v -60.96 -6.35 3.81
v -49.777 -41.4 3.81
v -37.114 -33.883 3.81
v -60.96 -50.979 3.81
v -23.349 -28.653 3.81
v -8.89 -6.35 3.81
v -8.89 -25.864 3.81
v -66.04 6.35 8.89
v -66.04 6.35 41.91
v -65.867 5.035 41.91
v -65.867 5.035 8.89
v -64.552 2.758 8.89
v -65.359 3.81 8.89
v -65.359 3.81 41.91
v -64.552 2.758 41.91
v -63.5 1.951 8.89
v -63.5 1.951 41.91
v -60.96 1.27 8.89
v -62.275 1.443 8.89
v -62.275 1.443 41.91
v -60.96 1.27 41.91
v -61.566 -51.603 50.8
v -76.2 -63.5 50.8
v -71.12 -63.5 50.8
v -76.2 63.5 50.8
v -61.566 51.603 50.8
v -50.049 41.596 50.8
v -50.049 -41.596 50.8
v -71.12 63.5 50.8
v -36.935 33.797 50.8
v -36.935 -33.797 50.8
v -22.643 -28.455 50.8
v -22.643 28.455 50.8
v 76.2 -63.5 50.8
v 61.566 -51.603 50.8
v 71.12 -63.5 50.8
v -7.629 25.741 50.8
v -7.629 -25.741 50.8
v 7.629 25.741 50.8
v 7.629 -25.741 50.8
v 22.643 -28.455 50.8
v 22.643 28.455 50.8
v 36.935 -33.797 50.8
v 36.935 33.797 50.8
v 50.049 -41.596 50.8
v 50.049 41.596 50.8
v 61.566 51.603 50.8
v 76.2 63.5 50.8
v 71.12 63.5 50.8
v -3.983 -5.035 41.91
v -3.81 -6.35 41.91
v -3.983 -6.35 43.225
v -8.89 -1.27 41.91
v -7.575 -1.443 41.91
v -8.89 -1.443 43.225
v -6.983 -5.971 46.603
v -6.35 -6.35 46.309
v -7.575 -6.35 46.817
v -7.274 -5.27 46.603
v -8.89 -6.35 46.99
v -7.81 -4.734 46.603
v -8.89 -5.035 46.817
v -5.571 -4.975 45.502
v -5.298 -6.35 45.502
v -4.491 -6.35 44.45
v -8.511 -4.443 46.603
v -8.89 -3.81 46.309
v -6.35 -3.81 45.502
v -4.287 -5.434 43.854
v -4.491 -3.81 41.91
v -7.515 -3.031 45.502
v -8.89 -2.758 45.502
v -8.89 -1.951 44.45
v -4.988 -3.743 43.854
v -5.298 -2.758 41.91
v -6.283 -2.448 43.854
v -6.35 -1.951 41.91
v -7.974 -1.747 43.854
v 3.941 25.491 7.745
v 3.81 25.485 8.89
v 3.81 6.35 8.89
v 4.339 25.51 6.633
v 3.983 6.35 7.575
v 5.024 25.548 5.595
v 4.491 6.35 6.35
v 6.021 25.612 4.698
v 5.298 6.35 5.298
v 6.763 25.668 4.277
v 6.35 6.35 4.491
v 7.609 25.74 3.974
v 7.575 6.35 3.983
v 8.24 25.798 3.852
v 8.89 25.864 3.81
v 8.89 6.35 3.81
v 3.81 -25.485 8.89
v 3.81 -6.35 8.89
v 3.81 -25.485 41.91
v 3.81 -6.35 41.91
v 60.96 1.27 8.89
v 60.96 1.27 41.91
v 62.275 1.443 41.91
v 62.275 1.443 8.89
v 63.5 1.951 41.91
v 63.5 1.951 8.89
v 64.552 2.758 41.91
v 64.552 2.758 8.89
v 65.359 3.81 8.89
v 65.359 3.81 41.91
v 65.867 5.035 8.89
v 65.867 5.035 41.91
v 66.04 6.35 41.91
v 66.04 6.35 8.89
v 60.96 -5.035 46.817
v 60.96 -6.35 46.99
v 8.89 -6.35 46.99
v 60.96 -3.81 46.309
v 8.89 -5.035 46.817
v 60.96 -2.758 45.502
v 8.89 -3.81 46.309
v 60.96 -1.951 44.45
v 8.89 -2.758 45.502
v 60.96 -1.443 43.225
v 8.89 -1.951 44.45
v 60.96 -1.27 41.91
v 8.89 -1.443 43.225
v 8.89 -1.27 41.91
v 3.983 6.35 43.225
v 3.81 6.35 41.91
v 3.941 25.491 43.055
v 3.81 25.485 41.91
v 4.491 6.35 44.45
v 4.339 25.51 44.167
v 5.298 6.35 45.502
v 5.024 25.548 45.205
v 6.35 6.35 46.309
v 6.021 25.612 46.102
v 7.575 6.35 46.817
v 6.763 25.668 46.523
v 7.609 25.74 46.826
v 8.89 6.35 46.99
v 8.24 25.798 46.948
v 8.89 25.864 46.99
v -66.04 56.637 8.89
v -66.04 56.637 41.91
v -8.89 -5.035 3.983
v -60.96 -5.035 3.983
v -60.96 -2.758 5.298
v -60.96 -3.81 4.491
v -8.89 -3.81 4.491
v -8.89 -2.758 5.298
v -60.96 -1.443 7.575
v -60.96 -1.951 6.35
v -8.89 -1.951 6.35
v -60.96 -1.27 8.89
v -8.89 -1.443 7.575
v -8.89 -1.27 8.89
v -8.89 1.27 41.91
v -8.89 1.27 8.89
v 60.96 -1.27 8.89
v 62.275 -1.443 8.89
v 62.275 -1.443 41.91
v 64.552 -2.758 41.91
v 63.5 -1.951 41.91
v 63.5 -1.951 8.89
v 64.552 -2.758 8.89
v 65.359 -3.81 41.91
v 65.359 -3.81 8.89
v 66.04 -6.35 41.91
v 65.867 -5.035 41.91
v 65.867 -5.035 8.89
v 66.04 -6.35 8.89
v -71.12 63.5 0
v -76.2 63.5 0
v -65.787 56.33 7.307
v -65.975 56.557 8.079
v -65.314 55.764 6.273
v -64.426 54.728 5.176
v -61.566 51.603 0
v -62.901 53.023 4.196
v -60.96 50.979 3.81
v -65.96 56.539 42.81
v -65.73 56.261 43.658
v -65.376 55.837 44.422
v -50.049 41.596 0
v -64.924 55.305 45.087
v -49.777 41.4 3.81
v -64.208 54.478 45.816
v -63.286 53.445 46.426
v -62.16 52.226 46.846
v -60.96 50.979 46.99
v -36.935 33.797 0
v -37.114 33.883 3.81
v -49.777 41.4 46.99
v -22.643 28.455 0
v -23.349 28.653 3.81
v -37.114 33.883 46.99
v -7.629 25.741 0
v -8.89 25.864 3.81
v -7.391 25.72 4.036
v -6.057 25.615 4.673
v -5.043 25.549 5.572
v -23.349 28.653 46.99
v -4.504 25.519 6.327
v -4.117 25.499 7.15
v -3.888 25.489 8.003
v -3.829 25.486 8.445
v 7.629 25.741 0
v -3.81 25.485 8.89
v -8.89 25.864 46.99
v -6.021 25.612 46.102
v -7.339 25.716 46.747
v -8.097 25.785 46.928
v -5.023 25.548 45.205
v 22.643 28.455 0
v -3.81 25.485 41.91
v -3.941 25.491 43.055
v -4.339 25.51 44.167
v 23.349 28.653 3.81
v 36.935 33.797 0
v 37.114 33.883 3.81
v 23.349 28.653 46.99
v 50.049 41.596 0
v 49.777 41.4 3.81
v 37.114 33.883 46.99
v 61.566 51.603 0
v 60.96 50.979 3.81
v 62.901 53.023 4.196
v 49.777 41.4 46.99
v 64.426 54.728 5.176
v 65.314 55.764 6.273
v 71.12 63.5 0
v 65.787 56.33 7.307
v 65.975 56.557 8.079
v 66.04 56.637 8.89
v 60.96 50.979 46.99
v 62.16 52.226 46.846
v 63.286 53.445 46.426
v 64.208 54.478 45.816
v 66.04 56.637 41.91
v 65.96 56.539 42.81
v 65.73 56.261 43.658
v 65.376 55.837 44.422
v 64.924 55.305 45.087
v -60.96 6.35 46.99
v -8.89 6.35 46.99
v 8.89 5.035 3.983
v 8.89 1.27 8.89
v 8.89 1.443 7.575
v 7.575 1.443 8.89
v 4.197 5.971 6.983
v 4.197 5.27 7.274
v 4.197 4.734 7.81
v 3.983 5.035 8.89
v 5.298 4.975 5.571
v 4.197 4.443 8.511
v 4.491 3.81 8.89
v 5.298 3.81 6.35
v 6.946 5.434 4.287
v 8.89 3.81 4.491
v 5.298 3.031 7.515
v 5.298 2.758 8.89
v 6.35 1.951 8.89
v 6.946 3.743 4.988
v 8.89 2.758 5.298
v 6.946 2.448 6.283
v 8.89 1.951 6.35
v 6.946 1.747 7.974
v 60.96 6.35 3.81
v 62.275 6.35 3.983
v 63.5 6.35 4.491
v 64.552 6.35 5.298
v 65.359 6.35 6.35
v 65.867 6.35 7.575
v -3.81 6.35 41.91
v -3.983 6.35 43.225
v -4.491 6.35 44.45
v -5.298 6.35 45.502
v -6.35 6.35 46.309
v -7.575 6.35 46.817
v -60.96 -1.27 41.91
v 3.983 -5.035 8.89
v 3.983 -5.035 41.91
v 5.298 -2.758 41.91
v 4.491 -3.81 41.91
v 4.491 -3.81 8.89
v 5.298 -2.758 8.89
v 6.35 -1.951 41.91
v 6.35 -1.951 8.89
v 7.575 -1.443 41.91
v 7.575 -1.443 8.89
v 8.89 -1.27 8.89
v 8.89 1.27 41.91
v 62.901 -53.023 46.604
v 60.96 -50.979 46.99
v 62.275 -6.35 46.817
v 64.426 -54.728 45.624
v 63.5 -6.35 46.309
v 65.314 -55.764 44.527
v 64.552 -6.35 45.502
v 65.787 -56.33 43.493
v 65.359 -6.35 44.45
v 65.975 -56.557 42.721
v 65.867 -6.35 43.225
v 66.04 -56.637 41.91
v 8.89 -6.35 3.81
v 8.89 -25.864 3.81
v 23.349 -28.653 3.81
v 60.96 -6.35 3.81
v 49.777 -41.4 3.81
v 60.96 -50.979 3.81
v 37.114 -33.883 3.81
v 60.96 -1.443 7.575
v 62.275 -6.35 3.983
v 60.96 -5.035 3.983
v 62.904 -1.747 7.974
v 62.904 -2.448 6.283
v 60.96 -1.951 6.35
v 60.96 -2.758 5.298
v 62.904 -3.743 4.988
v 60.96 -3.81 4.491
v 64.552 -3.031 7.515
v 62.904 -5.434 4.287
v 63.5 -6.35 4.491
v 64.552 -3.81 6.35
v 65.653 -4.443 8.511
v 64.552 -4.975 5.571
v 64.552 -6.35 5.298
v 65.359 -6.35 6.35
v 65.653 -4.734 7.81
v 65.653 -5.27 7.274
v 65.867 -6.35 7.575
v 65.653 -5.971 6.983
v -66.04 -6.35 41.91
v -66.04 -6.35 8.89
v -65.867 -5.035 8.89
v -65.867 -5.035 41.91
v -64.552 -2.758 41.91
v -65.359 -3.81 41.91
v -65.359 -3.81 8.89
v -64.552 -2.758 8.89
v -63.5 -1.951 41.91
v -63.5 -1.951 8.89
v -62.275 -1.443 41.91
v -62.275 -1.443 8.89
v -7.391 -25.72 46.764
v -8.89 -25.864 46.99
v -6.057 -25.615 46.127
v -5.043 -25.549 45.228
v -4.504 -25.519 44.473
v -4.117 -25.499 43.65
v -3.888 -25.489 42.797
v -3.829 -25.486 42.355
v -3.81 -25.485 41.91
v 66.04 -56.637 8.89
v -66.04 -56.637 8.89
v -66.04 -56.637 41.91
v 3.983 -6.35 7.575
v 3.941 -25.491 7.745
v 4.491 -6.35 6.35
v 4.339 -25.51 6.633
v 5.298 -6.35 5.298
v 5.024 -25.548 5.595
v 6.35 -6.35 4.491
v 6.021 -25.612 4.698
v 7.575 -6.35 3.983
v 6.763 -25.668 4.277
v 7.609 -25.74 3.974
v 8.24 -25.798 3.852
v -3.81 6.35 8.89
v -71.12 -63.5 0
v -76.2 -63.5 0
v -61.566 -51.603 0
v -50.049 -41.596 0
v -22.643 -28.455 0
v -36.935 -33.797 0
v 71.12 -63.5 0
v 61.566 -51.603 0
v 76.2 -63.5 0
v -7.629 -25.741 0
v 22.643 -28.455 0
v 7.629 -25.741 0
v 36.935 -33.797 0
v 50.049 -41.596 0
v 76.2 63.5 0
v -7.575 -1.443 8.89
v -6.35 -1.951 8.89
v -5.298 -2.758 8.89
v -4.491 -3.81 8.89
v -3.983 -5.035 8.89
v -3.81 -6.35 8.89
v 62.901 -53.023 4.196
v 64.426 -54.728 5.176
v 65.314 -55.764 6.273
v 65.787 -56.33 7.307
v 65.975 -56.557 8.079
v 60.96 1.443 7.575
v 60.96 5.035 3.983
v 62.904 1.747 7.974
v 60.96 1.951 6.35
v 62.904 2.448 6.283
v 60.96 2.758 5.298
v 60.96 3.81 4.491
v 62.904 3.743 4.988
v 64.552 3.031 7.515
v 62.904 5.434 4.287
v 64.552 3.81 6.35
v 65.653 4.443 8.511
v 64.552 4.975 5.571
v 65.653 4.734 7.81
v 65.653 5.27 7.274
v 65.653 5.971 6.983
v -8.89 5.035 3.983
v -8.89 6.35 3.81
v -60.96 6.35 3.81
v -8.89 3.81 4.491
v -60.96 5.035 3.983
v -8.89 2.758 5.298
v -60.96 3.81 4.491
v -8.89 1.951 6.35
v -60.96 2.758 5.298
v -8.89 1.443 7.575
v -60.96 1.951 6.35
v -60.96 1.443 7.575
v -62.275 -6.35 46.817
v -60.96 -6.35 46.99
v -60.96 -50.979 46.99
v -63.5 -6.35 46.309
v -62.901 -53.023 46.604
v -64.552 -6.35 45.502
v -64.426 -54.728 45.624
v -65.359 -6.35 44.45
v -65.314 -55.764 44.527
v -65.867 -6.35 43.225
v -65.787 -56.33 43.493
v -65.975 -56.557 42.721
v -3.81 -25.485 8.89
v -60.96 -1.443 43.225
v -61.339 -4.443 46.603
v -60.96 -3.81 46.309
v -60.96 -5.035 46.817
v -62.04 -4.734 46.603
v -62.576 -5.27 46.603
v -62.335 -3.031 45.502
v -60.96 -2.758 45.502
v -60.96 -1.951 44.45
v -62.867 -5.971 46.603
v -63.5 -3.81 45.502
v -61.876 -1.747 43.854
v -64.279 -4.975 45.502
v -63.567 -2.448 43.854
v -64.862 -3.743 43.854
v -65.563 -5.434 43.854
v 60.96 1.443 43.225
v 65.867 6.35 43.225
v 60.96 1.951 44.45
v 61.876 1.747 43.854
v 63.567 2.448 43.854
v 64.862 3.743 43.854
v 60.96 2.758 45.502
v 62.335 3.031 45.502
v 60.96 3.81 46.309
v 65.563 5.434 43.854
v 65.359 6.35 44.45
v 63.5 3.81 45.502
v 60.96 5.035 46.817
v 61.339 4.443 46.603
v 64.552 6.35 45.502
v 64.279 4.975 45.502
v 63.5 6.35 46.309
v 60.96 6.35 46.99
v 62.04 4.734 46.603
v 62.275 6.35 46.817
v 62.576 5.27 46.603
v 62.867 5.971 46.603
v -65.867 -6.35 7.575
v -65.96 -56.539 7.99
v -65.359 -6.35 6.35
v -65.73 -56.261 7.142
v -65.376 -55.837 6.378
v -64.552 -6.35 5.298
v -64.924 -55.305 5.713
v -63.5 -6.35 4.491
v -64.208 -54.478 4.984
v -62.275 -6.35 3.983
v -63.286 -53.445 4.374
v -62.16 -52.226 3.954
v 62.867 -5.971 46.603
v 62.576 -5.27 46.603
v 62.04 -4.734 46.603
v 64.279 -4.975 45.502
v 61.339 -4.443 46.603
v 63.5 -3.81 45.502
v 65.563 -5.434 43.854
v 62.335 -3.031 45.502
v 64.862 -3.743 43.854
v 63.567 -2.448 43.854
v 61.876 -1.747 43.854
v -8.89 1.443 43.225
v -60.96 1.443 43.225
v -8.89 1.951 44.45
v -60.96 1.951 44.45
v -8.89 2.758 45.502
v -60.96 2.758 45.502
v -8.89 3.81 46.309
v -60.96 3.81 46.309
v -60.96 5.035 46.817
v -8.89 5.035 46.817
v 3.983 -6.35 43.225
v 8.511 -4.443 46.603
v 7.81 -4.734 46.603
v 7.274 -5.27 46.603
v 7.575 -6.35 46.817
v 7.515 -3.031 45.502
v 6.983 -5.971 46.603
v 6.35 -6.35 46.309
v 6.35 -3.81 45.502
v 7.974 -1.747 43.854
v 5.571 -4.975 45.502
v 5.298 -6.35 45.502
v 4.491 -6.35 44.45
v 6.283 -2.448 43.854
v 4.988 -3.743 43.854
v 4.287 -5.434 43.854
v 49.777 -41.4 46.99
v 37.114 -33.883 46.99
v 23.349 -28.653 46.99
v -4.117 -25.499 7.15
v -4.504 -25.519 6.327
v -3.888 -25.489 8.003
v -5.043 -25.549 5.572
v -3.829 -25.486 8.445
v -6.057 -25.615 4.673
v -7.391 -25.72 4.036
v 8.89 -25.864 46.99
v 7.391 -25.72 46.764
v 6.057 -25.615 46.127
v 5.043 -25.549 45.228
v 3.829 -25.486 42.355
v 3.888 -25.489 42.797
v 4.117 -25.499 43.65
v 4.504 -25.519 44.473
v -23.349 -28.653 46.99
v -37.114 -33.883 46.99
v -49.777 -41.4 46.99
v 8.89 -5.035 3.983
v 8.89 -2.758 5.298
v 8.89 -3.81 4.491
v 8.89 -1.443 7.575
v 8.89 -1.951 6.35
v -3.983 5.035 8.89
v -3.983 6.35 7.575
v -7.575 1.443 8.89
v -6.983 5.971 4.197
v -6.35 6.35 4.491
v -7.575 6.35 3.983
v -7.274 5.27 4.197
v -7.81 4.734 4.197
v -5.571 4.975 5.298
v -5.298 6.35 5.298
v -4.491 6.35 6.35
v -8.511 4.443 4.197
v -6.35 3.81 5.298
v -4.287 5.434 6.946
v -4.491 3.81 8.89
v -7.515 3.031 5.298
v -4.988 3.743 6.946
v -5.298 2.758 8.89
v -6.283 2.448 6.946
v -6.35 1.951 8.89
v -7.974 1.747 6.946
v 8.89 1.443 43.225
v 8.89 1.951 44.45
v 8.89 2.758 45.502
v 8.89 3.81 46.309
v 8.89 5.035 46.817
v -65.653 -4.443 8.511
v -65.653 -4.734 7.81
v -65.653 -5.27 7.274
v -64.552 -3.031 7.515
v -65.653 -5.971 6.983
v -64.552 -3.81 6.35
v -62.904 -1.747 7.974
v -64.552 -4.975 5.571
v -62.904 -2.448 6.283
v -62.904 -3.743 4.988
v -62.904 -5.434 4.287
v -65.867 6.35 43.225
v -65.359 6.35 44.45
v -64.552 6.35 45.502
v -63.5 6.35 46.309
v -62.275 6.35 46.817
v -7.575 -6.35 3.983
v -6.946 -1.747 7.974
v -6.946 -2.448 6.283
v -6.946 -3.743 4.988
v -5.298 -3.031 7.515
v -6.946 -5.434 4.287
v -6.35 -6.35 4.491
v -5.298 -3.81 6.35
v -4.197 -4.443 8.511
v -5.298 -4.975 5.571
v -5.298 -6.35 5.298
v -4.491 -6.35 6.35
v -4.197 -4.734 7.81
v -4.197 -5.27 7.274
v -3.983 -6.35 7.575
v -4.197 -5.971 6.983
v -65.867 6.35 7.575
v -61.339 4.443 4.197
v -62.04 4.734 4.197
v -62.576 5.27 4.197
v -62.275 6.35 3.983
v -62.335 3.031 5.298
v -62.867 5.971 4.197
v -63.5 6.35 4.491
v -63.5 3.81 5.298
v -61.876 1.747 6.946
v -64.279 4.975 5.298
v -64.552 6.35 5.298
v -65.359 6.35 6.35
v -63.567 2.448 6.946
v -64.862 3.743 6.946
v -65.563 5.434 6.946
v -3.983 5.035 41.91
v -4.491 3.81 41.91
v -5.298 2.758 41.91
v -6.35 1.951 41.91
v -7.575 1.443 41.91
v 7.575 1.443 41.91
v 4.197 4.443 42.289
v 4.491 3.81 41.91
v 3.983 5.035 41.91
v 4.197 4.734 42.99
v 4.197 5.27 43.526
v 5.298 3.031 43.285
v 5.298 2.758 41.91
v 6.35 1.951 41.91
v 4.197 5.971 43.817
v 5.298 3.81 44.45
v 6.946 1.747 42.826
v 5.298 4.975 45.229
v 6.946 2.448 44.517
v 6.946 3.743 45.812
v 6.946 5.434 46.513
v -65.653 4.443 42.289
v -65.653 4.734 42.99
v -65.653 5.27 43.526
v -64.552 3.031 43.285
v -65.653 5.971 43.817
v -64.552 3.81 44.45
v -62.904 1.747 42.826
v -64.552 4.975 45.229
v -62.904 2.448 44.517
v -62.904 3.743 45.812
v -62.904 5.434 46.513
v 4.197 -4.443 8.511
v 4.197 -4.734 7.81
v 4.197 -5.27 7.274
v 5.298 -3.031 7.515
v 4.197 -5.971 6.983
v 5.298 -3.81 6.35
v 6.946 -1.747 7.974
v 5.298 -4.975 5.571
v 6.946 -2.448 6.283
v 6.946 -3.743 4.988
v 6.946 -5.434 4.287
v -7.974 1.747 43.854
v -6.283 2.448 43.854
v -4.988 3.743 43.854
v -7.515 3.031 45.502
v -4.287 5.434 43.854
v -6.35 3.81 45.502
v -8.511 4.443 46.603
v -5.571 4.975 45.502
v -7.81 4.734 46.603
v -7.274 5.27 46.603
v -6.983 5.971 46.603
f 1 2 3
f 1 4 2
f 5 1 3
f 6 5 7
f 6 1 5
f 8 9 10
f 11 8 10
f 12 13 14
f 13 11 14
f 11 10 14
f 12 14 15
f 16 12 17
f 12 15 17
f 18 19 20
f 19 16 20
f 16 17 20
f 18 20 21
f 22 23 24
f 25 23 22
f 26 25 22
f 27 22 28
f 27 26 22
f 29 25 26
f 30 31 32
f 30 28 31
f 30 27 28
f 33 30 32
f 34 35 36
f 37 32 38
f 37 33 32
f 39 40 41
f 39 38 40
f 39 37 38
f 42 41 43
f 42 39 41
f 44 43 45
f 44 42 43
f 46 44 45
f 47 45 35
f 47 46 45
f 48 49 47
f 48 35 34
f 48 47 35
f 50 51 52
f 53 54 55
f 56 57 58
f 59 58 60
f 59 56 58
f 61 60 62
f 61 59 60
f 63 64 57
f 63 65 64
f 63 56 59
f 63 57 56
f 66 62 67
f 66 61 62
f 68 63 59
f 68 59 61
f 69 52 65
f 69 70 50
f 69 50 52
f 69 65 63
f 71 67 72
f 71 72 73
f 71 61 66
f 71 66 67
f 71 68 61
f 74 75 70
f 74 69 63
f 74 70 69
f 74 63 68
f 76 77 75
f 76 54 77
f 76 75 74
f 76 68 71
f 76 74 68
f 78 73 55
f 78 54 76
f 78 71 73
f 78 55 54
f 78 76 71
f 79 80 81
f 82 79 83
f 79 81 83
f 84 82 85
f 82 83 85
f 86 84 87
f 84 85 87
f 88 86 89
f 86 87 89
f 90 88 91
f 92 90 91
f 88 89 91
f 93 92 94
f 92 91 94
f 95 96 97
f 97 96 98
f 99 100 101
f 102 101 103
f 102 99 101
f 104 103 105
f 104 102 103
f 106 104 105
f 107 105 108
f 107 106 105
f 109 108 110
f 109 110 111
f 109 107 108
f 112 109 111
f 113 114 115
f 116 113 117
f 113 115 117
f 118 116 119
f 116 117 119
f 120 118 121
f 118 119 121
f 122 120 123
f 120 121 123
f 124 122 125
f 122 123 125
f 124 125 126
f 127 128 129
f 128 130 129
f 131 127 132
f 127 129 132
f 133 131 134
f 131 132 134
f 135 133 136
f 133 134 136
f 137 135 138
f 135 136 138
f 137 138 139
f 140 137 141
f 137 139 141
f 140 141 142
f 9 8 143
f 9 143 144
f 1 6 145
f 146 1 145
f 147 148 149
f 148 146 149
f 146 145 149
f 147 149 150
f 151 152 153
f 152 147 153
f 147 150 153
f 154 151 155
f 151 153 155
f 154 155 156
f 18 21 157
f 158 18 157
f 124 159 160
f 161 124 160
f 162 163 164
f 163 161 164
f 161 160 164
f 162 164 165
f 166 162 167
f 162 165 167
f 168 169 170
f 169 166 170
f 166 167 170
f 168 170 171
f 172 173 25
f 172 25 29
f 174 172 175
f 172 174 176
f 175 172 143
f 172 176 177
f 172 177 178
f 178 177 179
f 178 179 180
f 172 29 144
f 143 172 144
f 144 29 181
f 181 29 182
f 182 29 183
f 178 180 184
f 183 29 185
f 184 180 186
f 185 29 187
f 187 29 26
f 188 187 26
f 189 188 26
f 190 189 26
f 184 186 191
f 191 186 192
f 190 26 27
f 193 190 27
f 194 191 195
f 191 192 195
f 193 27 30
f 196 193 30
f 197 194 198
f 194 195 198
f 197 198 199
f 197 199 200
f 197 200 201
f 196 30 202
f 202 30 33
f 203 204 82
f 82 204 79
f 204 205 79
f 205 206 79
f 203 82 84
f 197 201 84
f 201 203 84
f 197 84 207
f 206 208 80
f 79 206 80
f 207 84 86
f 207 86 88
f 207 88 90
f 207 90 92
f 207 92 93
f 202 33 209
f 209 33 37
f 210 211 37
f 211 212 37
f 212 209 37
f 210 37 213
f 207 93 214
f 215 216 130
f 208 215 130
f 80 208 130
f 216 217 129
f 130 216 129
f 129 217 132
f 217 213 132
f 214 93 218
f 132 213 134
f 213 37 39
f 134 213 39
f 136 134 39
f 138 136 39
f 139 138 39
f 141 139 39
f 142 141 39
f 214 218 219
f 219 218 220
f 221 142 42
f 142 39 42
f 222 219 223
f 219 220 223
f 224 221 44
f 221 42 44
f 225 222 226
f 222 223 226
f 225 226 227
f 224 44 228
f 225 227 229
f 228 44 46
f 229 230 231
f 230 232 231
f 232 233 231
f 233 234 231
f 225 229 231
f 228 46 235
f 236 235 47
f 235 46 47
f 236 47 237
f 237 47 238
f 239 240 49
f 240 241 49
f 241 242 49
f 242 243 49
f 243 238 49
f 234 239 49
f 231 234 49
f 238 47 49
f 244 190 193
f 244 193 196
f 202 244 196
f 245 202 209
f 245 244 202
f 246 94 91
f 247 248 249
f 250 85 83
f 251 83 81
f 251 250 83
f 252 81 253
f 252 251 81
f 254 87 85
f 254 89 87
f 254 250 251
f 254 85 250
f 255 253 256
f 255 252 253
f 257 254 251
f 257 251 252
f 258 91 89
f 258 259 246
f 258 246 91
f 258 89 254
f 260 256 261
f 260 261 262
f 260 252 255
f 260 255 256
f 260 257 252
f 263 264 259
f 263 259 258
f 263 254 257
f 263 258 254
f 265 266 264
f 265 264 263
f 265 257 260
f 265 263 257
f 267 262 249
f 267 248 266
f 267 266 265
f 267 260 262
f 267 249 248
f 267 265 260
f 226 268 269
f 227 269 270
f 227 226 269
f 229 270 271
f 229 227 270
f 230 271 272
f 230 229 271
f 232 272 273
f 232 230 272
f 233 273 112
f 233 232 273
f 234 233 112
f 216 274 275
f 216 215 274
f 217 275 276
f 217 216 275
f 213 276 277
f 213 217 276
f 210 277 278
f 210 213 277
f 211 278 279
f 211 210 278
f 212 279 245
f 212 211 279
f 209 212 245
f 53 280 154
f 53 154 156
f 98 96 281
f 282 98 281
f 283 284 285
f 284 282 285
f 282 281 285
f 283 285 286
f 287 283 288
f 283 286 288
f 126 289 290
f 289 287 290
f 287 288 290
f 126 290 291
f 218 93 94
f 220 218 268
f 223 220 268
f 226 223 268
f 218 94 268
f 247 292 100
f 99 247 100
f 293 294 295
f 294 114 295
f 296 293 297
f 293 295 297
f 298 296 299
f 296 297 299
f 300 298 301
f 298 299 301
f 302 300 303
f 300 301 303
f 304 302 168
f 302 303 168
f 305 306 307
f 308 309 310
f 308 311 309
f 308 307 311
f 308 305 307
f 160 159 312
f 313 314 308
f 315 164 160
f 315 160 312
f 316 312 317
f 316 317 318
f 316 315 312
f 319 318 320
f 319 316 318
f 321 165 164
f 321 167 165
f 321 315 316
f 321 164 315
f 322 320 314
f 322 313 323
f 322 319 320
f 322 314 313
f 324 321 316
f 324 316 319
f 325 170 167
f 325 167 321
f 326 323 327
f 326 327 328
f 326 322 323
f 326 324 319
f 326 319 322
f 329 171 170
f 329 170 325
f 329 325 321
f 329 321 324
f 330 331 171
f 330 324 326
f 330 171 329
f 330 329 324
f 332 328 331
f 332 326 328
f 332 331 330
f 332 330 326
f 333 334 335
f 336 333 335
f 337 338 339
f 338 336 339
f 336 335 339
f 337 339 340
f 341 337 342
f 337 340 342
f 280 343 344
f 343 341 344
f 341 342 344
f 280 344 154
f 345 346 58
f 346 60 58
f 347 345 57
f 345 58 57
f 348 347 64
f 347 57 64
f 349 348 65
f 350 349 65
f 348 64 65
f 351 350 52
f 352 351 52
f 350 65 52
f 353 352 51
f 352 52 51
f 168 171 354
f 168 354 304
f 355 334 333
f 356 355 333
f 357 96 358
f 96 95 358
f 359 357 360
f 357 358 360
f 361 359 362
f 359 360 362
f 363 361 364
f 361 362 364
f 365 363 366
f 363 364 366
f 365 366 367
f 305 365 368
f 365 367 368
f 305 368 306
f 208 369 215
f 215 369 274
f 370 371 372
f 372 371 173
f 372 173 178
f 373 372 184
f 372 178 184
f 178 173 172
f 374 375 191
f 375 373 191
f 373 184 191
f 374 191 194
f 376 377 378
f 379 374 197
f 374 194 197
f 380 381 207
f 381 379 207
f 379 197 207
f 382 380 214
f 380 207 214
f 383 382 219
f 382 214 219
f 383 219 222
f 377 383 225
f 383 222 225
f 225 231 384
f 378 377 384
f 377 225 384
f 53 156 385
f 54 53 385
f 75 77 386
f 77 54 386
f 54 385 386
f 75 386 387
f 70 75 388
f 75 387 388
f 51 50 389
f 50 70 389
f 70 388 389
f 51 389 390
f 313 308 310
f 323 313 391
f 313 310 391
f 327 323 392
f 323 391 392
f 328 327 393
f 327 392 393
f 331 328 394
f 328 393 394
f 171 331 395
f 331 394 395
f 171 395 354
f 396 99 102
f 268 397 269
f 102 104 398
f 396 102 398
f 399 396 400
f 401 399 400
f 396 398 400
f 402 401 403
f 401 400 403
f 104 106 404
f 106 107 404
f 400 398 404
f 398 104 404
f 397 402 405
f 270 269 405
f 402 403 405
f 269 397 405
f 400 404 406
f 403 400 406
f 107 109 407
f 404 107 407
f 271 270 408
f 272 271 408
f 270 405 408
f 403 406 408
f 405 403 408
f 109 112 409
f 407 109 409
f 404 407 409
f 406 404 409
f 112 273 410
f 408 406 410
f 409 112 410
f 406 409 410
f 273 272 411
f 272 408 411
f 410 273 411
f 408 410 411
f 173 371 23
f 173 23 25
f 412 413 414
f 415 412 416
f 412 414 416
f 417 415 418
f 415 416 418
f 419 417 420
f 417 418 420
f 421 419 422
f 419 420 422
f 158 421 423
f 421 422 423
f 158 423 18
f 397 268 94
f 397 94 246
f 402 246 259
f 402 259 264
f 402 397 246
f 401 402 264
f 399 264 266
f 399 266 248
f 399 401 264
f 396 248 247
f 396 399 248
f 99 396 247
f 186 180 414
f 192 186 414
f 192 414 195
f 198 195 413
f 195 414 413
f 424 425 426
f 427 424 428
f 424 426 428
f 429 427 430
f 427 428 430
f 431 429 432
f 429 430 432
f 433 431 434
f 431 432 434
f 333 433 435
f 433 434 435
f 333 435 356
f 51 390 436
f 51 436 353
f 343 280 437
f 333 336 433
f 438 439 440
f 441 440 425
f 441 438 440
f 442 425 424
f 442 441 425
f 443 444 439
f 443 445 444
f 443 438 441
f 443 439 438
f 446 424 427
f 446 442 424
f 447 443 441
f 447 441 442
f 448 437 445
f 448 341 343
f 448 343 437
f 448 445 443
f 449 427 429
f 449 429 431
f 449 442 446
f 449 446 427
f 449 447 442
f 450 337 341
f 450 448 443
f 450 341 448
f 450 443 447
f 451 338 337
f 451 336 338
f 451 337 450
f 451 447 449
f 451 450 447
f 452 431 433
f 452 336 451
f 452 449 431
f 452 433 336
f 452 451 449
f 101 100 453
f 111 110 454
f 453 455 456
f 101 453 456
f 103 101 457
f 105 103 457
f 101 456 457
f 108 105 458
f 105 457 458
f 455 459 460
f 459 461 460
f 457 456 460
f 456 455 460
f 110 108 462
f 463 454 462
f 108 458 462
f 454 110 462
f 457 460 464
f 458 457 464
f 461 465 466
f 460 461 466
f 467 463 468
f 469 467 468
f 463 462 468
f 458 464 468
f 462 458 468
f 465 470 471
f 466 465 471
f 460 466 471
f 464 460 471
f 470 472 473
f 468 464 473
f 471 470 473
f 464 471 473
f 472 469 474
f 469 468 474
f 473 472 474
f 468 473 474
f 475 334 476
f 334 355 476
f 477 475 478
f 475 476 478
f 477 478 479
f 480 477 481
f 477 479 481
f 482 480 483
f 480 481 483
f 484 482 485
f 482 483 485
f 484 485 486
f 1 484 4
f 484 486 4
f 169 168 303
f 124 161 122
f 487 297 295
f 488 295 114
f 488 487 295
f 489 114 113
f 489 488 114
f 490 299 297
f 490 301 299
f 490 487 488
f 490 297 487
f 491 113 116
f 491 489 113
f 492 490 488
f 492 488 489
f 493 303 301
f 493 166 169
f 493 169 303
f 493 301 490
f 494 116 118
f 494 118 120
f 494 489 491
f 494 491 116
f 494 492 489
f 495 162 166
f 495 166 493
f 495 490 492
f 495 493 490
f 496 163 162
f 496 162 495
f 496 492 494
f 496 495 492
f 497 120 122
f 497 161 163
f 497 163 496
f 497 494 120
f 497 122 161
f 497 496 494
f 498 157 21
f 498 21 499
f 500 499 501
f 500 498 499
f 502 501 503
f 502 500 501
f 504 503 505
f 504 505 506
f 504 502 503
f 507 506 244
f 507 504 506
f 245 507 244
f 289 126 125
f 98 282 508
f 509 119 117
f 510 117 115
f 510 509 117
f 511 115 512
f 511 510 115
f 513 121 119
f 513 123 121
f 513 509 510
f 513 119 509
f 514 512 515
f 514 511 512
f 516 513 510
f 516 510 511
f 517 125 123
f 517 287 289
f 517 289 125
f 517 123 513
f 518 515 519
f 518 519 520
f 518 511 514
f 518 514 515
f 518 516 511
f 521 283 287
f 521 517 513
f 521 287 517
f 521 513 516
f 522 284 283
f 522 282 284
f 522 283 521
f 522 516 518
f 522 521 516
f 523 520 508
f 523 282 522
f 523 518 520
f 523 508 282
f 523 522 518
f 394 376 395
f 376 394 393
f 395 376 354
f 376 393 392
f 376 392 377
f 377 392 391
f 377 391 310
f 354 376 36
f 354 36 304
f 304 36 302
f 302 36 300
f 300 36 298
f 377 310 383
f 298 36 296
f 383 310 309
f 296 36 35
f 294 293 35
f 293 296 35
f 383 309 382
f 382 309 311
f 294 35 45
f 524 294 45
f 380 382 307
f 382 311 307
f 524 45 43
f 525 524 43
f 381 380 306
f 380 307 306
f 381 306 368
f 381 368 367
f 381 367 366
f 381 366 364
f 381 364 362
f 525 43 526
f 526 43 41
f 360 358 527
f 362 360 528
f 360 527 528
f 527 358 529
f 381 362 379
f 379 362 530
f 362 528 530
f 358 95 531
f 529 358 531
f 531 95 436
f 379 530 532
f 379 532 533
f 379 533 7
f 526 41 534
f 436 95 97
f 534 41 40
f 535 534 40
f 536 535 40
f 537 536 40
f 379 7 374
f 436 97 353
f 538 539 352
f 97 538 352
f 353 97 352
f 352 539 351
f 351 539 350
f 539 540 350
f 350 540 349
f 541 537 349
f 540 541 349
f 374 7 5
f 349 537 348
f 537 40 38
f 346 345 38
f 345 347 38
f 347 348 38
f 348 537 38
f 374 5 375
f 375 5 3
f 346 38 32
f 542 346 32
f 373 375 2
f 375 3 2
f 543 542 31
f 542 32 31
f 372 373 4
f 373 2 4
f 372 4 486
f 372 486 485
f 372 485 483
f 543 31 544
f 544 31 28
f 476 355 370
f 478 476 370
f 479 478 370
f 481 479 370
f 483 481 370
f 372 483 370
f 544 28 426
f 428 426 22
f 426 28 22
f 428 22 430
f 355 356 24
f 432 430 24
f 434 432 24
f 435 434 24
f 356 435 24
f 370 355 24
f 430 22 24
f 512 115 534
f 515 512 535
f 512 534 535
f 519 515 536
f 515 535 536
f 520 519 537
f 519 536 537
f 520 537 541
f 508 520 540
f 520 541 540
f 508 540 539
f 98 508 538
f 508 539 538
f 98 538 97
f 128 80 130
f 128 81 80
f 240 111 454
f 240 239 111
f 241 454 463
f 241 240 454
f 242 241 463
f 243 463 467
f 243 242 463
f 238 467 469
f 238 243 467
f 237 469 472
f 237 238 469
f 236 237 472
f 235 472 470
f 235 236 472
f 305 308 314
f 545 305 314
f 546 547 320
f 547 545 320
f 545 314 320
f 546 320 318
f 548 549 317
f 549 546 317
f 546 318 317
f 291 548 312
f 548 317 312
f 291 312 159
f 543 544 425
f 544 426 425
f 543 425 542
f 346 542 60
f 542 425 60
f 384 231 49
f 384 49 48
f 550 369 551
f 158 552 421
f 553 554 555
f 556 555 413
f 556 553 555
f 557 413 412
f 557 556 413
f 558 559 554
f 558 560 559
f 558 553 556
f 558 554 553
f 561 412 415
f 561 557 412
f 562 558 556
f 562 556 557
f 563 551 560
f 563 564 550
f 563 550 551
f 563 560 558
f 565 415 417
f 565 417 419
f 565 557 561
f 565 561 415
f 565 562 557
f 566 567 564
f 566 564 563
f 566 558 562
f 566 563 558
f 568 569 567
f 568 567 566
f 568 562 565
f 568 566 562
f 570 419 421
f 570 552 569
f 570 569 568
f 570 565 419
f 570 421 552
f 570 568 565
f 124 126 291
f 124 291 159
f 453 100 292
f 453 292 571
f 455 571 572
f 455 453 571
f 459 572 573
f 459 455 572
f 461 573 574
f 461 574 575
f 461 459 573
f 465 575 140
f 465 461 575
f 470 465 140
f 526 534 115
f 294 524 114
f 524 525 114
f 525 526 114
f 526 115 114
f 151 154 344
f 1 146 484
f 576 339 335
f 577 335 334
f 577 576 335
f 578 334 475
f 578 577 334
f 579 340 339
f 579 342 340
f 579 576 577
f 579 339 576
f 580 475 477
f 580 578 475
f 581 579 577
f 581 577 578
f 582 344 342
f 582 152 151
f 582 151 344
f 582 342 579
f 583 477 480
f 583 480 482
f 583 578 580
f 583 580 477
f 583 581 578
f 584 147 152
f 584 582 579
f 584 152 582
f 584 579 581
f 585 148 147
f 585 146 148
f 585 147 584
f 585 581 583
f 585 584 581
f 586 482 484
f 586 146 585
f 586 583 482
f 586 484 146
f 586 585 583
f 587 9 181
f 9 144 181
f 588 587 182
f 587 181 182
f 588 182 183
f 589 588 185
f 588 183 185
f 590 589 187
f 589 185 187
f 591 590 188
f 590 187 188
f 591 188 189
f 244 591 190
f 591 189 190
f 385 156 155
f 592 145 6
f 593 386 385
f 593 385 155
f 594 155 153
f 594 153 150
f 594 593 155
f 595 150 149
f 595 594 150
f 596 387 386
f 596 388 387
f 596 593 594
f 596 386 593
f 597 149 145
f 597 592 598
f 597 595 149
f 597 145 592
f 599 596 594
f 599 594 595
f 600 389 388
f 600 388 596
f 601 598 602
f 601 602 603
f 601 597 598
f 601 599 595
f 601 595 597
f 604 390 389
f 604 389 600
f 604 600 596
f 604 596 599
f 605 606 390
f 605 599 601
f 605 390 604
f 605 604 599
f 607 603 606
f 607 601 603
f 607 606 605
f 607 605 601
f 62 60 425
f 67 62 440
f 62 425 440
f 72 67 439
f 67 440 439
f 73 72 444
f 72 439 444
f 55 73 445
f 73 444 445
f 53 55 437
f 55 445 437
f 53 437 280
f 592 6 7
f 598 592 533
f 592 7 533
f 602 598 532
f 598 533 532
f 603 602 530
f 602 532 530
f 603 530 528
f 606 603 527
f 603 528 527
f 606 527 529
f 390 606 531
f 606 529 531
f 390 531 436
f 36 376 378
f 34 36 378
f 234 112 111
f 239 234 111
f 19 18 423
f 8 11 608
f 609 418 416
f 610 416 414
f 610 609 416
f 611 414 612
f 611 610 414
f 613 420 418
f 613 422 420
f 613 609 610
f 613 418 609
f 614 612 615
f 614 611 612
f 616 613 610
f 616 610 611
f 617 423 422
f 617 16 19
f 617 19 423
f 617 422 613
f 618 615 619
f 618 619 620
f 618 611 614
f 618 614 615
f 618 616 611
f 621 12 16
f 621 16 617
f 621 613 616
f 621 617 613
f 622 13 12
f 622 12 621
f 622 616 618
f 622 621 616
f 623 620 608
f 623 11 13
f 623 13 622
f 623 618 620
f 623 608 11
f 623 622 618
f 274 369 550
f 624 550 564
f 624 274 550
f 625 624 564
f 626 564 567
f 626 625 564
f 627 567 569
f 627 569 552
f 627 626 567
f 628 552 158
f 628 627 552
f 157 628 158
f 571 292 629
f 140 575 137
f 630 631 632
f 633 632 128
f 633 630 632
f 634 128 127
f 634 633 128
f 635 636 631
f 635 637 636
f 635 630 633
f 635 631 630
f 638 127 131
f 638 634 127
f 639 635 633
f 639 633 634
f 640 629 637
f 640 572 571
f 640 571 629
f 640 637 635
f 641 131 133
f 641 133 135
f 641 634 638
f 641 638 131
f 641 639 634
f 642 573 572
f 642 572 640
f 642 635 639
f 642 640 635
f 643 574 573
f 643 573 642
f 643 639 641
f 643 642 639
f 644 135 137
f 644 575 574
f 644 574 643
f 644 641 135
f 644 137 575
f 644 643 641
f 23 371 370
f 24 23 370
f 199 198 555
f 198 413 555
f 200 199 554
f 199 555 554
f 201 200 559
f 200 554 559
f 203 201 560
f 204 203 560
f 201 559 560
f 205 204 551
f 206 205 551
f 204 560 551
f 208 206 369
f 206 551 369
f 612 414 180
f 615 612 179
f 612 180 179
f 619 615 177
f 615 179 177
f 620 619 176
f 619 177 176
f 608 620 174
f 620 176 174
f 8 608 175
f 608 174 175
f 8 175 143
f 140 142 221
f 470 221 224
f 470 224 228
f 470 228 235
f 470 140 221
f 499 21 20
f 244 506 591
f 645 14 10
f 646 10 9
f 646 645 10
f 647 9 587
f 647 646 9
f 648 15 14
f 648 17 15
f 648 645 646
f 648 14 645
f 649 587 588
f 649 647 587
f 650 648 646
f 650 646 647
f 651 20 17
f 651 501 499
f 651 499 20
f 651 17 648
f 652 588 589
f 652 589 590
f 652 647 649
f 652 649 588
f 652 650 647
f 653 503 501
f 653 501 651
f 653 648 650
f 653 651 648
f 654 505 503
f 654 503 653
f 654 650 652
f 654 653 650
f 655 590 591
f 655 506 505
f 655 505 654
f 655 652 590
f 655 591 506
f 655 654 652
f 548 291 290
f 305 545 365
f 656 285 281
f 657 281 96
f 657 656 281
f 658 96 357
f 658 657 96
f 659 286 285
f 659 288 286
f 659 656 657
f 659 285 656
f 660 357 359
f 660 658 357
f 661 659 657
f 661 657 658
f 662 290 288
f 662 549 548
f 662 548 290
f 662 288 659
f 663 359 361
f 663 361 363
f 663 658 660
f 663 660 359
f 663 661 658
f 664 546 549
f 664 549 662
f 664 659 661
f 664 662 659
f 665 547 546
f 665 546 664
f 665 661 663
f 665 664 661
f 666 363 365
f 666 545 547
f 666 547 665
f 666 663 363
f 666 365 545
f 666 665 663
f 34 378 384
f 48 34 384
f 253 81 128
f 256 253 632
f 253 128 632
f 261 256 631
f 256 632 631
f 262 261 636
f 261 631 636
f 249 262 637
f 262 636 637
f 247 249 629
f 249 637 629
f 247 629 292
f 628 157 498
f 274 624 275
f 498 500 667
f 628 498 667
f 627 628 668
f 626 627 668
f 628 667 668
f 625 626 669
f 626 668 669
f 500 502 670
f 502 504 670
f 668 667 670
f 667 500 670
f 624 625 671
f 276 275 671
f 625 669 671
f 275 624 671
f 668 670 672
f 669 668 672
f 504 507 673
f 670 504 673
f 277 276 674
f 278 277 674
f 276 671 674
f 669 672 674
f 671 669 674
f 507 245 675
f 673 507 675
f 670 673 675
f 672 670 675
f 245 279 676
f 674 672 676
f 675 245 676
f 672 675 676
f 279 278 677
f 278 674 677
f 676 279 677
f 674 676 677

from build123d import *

# Parameters (mm, degrees)
F0_W     = 152.4
F0_H     = 127
F1_DEPTH = 50.8
F3_DEPTH = 50.801
F5_W     = 62.23
F5_H     = 43.18
F6_DEPTH = 62.231
F7_F1_R  = 5.08
F7_F2_R  = 5.08
F7_F3_R  = 5.08
F7_F4_R  = 5.08
F7_F5_R  = 5.08
F7_F6_R  = 5.08
F7_F7_R  = 5.08
F7_F8_R  = 5.08
F7_F9_R  = 5.08
F7_F10_R = 5.08
F7_F11_R = 5.08
F7_F12_R = 5.08
F7_F13_R = 5.08
F7_F14_R = 5.08
F7_F15_R = 5.08
F7_F16_R = 5.08


# Not quite as in the source:
# - a pattern or mirror of a feature is missing from the dataset's text; its kind, count and spacing are read off the source's solid


with BuildPart() as f1:
    # F0 (on Top) → F1 (new body)
    with BuildSketch(Plane.XY):
        Rectangle(F0_W, F0_H)
    extrude(amount=F1_DEPTH)

    # F2 (on face) → F3 (cut, through all)
    with BuildSketch(Plane.XY.offset(50.8)):
        with BuildLine():
            Line((-71.12, -63.5), (71.12, -63.5))
            ThreePointArc((71.12, -63.5), (0, -25.4), (-71.12, -63.5))
        make_face()
        with BuildLine():
            ThreePointArc((-71.12, 63.5), (0, 25.4), (71.12, 63.5))
            Line((71.12, 63.5), (-71.12, 63.5))
        make_face()
    extrude(amount=-F3_DEPTH, mode=Mode.SUBTRACT)

    # F5 (on offset) → F6 (cut, through all)
    with BuildSketch(Plane.XZ.offset(1.27)):
        with Locations((-34.925, 25.4)):
            Rectangle(F5_W, F5_H)
        with Locations((34.925, 25.4)):
            Rectangle(F5_W, F5_H)
    f6 = extrude(amount=F6_DEPTH, mode=Mode.SUBTRACT)

    # F6_copies: F6 across plane
    add(f6.mirror(Plane.ZX), mode=Mode.SUBTRACT)

    # F7: fillet of radius 5.08 on 28 edges, made by hand

    # F7_f1
    f7_f1_edges = [f1.edges().sort_by_distance(p)[0] for p in [
        (34.925, -1.27, 3.81),
    ]]
    fillet(f7_f1_edges, radius=F7_F1_R)

    # F7_f2
    f7_f2_edges = [f1.edges().sort_by_distance(p)[0] for p in [
        (66.04, -31.4933212262, 3.81),
    ]]
    fillet(f7_f2_edges, radius=F7_F2_R)

    # F7_f3
    f7_f3_edges = [f1.edges().sort_by_distance(p)[0] for p in [
        (3.81, -15.9175013231, 3.81),
    ]]
    fillet(f7_f3_edges, radius=F7_F3_R)

    # F7_f4
    f7_f4_edges = [f1.edges().sort_by_distance(p)[0] for p in [
        (3.81, -15.9175013231, 46.99),
    ]]
    fillet(f7_f4_edges, radius=F7_F4_R)

    # F7_f5
    f7_f5_edges = [f1.edges().sort_by_distance(p)[0] for p in [
        (-34.925, -1.27, 3.81),
    ]]
    fillet(f7_f5_edges, radius=F7_F5_R)

    # F7_f6
    f7_f6_edges = [f1.edges().sort_by_distance(p)[0] for p in [
        (-3.81, -15.9175013231, 3.81),
    ]]
    fillet(f7_f6_edges, radius=F7_F6_R)

    # F7_f7
    f7_f7_edges = [f1.edges().sort_by_distance(p)[0] for p in [
        (-66.04, -31.4933212262, 3.81),
    ]]
    fillet(f7_f7_edges, radius=F7_F7_R)

    # F7_f8
    f7_f8_edges = [f1.edges().sort_by_distance(p)[0] for p in [
        (-66.04, -31.4933212262, 46.99),
    ]]
    fillet(f7_f8_edges, radius=F7_F8_R)

    # F7_f9
    f7_f9_edges = [f1.edges().sort_by_distance(p)[0] for p in [
        (-3.81, 1.27, 25.4),
    ]]
    fillet(f7_f9_edges, radius=F7_F9_R)

    # F7_f10
    f7_f10_edges = [f1.edges().sort_by_distance(p)[0] for p in [
        (-37.465, 1.27, 46.99),
    ]]
    fillet(f7_f10_edges, radius=F7_F10_R)

    # F7_f11
    f7_f11_edges = [f1.edges().sort_by_distance(p)[0] for p in [
        (-66.04, 31.4933212262, 46.99),
    ]]
    fillet(f7_f11_edges, radius=F7_F11_R)

    # F7_f12
    f7_f12_edges = [f1.edges().sort_by_distance(p)[0] for p in [
        (-66.04, 31.4933212262, 3.81),
    ]]
    fillet(f7_f12_edges, radius=F7_F12_R)

    # F7_f13
    f7_f13_edges = [f1.edges().sort_by_distance(p)[0] for p in [
        (34.925, 1.27, 3.81),
    ]]
    fillet(f7_f13_edges, radius=F7_F13_R)

    # F7_f14
    f7_f14_edges = [f1.edges().sort_by_distance(p)[0] for p in [
        (66.04, 31.4933212262, 3.81),
    ]]
    fillet(f7_f14_edges, radius=F7_F14_R)

    # F7_f15
    f7_f15_edges = [f1.edges().sort_by_distance(p)[0] for p in [
        (66.04, 31.4933212262, 46.99),
    ]]
    fillet(f7_f15_edges, radius=F7_F15_R)

    # F7_f16
    f7_f16_edges = [f1.edges().sort_by_distance(p)[0] for p in [
        (3.81, 1.27, 25.4),
    ]]
    fillet(f7_f16_edges, radius=F7_F16_R)


solid = f1.part
